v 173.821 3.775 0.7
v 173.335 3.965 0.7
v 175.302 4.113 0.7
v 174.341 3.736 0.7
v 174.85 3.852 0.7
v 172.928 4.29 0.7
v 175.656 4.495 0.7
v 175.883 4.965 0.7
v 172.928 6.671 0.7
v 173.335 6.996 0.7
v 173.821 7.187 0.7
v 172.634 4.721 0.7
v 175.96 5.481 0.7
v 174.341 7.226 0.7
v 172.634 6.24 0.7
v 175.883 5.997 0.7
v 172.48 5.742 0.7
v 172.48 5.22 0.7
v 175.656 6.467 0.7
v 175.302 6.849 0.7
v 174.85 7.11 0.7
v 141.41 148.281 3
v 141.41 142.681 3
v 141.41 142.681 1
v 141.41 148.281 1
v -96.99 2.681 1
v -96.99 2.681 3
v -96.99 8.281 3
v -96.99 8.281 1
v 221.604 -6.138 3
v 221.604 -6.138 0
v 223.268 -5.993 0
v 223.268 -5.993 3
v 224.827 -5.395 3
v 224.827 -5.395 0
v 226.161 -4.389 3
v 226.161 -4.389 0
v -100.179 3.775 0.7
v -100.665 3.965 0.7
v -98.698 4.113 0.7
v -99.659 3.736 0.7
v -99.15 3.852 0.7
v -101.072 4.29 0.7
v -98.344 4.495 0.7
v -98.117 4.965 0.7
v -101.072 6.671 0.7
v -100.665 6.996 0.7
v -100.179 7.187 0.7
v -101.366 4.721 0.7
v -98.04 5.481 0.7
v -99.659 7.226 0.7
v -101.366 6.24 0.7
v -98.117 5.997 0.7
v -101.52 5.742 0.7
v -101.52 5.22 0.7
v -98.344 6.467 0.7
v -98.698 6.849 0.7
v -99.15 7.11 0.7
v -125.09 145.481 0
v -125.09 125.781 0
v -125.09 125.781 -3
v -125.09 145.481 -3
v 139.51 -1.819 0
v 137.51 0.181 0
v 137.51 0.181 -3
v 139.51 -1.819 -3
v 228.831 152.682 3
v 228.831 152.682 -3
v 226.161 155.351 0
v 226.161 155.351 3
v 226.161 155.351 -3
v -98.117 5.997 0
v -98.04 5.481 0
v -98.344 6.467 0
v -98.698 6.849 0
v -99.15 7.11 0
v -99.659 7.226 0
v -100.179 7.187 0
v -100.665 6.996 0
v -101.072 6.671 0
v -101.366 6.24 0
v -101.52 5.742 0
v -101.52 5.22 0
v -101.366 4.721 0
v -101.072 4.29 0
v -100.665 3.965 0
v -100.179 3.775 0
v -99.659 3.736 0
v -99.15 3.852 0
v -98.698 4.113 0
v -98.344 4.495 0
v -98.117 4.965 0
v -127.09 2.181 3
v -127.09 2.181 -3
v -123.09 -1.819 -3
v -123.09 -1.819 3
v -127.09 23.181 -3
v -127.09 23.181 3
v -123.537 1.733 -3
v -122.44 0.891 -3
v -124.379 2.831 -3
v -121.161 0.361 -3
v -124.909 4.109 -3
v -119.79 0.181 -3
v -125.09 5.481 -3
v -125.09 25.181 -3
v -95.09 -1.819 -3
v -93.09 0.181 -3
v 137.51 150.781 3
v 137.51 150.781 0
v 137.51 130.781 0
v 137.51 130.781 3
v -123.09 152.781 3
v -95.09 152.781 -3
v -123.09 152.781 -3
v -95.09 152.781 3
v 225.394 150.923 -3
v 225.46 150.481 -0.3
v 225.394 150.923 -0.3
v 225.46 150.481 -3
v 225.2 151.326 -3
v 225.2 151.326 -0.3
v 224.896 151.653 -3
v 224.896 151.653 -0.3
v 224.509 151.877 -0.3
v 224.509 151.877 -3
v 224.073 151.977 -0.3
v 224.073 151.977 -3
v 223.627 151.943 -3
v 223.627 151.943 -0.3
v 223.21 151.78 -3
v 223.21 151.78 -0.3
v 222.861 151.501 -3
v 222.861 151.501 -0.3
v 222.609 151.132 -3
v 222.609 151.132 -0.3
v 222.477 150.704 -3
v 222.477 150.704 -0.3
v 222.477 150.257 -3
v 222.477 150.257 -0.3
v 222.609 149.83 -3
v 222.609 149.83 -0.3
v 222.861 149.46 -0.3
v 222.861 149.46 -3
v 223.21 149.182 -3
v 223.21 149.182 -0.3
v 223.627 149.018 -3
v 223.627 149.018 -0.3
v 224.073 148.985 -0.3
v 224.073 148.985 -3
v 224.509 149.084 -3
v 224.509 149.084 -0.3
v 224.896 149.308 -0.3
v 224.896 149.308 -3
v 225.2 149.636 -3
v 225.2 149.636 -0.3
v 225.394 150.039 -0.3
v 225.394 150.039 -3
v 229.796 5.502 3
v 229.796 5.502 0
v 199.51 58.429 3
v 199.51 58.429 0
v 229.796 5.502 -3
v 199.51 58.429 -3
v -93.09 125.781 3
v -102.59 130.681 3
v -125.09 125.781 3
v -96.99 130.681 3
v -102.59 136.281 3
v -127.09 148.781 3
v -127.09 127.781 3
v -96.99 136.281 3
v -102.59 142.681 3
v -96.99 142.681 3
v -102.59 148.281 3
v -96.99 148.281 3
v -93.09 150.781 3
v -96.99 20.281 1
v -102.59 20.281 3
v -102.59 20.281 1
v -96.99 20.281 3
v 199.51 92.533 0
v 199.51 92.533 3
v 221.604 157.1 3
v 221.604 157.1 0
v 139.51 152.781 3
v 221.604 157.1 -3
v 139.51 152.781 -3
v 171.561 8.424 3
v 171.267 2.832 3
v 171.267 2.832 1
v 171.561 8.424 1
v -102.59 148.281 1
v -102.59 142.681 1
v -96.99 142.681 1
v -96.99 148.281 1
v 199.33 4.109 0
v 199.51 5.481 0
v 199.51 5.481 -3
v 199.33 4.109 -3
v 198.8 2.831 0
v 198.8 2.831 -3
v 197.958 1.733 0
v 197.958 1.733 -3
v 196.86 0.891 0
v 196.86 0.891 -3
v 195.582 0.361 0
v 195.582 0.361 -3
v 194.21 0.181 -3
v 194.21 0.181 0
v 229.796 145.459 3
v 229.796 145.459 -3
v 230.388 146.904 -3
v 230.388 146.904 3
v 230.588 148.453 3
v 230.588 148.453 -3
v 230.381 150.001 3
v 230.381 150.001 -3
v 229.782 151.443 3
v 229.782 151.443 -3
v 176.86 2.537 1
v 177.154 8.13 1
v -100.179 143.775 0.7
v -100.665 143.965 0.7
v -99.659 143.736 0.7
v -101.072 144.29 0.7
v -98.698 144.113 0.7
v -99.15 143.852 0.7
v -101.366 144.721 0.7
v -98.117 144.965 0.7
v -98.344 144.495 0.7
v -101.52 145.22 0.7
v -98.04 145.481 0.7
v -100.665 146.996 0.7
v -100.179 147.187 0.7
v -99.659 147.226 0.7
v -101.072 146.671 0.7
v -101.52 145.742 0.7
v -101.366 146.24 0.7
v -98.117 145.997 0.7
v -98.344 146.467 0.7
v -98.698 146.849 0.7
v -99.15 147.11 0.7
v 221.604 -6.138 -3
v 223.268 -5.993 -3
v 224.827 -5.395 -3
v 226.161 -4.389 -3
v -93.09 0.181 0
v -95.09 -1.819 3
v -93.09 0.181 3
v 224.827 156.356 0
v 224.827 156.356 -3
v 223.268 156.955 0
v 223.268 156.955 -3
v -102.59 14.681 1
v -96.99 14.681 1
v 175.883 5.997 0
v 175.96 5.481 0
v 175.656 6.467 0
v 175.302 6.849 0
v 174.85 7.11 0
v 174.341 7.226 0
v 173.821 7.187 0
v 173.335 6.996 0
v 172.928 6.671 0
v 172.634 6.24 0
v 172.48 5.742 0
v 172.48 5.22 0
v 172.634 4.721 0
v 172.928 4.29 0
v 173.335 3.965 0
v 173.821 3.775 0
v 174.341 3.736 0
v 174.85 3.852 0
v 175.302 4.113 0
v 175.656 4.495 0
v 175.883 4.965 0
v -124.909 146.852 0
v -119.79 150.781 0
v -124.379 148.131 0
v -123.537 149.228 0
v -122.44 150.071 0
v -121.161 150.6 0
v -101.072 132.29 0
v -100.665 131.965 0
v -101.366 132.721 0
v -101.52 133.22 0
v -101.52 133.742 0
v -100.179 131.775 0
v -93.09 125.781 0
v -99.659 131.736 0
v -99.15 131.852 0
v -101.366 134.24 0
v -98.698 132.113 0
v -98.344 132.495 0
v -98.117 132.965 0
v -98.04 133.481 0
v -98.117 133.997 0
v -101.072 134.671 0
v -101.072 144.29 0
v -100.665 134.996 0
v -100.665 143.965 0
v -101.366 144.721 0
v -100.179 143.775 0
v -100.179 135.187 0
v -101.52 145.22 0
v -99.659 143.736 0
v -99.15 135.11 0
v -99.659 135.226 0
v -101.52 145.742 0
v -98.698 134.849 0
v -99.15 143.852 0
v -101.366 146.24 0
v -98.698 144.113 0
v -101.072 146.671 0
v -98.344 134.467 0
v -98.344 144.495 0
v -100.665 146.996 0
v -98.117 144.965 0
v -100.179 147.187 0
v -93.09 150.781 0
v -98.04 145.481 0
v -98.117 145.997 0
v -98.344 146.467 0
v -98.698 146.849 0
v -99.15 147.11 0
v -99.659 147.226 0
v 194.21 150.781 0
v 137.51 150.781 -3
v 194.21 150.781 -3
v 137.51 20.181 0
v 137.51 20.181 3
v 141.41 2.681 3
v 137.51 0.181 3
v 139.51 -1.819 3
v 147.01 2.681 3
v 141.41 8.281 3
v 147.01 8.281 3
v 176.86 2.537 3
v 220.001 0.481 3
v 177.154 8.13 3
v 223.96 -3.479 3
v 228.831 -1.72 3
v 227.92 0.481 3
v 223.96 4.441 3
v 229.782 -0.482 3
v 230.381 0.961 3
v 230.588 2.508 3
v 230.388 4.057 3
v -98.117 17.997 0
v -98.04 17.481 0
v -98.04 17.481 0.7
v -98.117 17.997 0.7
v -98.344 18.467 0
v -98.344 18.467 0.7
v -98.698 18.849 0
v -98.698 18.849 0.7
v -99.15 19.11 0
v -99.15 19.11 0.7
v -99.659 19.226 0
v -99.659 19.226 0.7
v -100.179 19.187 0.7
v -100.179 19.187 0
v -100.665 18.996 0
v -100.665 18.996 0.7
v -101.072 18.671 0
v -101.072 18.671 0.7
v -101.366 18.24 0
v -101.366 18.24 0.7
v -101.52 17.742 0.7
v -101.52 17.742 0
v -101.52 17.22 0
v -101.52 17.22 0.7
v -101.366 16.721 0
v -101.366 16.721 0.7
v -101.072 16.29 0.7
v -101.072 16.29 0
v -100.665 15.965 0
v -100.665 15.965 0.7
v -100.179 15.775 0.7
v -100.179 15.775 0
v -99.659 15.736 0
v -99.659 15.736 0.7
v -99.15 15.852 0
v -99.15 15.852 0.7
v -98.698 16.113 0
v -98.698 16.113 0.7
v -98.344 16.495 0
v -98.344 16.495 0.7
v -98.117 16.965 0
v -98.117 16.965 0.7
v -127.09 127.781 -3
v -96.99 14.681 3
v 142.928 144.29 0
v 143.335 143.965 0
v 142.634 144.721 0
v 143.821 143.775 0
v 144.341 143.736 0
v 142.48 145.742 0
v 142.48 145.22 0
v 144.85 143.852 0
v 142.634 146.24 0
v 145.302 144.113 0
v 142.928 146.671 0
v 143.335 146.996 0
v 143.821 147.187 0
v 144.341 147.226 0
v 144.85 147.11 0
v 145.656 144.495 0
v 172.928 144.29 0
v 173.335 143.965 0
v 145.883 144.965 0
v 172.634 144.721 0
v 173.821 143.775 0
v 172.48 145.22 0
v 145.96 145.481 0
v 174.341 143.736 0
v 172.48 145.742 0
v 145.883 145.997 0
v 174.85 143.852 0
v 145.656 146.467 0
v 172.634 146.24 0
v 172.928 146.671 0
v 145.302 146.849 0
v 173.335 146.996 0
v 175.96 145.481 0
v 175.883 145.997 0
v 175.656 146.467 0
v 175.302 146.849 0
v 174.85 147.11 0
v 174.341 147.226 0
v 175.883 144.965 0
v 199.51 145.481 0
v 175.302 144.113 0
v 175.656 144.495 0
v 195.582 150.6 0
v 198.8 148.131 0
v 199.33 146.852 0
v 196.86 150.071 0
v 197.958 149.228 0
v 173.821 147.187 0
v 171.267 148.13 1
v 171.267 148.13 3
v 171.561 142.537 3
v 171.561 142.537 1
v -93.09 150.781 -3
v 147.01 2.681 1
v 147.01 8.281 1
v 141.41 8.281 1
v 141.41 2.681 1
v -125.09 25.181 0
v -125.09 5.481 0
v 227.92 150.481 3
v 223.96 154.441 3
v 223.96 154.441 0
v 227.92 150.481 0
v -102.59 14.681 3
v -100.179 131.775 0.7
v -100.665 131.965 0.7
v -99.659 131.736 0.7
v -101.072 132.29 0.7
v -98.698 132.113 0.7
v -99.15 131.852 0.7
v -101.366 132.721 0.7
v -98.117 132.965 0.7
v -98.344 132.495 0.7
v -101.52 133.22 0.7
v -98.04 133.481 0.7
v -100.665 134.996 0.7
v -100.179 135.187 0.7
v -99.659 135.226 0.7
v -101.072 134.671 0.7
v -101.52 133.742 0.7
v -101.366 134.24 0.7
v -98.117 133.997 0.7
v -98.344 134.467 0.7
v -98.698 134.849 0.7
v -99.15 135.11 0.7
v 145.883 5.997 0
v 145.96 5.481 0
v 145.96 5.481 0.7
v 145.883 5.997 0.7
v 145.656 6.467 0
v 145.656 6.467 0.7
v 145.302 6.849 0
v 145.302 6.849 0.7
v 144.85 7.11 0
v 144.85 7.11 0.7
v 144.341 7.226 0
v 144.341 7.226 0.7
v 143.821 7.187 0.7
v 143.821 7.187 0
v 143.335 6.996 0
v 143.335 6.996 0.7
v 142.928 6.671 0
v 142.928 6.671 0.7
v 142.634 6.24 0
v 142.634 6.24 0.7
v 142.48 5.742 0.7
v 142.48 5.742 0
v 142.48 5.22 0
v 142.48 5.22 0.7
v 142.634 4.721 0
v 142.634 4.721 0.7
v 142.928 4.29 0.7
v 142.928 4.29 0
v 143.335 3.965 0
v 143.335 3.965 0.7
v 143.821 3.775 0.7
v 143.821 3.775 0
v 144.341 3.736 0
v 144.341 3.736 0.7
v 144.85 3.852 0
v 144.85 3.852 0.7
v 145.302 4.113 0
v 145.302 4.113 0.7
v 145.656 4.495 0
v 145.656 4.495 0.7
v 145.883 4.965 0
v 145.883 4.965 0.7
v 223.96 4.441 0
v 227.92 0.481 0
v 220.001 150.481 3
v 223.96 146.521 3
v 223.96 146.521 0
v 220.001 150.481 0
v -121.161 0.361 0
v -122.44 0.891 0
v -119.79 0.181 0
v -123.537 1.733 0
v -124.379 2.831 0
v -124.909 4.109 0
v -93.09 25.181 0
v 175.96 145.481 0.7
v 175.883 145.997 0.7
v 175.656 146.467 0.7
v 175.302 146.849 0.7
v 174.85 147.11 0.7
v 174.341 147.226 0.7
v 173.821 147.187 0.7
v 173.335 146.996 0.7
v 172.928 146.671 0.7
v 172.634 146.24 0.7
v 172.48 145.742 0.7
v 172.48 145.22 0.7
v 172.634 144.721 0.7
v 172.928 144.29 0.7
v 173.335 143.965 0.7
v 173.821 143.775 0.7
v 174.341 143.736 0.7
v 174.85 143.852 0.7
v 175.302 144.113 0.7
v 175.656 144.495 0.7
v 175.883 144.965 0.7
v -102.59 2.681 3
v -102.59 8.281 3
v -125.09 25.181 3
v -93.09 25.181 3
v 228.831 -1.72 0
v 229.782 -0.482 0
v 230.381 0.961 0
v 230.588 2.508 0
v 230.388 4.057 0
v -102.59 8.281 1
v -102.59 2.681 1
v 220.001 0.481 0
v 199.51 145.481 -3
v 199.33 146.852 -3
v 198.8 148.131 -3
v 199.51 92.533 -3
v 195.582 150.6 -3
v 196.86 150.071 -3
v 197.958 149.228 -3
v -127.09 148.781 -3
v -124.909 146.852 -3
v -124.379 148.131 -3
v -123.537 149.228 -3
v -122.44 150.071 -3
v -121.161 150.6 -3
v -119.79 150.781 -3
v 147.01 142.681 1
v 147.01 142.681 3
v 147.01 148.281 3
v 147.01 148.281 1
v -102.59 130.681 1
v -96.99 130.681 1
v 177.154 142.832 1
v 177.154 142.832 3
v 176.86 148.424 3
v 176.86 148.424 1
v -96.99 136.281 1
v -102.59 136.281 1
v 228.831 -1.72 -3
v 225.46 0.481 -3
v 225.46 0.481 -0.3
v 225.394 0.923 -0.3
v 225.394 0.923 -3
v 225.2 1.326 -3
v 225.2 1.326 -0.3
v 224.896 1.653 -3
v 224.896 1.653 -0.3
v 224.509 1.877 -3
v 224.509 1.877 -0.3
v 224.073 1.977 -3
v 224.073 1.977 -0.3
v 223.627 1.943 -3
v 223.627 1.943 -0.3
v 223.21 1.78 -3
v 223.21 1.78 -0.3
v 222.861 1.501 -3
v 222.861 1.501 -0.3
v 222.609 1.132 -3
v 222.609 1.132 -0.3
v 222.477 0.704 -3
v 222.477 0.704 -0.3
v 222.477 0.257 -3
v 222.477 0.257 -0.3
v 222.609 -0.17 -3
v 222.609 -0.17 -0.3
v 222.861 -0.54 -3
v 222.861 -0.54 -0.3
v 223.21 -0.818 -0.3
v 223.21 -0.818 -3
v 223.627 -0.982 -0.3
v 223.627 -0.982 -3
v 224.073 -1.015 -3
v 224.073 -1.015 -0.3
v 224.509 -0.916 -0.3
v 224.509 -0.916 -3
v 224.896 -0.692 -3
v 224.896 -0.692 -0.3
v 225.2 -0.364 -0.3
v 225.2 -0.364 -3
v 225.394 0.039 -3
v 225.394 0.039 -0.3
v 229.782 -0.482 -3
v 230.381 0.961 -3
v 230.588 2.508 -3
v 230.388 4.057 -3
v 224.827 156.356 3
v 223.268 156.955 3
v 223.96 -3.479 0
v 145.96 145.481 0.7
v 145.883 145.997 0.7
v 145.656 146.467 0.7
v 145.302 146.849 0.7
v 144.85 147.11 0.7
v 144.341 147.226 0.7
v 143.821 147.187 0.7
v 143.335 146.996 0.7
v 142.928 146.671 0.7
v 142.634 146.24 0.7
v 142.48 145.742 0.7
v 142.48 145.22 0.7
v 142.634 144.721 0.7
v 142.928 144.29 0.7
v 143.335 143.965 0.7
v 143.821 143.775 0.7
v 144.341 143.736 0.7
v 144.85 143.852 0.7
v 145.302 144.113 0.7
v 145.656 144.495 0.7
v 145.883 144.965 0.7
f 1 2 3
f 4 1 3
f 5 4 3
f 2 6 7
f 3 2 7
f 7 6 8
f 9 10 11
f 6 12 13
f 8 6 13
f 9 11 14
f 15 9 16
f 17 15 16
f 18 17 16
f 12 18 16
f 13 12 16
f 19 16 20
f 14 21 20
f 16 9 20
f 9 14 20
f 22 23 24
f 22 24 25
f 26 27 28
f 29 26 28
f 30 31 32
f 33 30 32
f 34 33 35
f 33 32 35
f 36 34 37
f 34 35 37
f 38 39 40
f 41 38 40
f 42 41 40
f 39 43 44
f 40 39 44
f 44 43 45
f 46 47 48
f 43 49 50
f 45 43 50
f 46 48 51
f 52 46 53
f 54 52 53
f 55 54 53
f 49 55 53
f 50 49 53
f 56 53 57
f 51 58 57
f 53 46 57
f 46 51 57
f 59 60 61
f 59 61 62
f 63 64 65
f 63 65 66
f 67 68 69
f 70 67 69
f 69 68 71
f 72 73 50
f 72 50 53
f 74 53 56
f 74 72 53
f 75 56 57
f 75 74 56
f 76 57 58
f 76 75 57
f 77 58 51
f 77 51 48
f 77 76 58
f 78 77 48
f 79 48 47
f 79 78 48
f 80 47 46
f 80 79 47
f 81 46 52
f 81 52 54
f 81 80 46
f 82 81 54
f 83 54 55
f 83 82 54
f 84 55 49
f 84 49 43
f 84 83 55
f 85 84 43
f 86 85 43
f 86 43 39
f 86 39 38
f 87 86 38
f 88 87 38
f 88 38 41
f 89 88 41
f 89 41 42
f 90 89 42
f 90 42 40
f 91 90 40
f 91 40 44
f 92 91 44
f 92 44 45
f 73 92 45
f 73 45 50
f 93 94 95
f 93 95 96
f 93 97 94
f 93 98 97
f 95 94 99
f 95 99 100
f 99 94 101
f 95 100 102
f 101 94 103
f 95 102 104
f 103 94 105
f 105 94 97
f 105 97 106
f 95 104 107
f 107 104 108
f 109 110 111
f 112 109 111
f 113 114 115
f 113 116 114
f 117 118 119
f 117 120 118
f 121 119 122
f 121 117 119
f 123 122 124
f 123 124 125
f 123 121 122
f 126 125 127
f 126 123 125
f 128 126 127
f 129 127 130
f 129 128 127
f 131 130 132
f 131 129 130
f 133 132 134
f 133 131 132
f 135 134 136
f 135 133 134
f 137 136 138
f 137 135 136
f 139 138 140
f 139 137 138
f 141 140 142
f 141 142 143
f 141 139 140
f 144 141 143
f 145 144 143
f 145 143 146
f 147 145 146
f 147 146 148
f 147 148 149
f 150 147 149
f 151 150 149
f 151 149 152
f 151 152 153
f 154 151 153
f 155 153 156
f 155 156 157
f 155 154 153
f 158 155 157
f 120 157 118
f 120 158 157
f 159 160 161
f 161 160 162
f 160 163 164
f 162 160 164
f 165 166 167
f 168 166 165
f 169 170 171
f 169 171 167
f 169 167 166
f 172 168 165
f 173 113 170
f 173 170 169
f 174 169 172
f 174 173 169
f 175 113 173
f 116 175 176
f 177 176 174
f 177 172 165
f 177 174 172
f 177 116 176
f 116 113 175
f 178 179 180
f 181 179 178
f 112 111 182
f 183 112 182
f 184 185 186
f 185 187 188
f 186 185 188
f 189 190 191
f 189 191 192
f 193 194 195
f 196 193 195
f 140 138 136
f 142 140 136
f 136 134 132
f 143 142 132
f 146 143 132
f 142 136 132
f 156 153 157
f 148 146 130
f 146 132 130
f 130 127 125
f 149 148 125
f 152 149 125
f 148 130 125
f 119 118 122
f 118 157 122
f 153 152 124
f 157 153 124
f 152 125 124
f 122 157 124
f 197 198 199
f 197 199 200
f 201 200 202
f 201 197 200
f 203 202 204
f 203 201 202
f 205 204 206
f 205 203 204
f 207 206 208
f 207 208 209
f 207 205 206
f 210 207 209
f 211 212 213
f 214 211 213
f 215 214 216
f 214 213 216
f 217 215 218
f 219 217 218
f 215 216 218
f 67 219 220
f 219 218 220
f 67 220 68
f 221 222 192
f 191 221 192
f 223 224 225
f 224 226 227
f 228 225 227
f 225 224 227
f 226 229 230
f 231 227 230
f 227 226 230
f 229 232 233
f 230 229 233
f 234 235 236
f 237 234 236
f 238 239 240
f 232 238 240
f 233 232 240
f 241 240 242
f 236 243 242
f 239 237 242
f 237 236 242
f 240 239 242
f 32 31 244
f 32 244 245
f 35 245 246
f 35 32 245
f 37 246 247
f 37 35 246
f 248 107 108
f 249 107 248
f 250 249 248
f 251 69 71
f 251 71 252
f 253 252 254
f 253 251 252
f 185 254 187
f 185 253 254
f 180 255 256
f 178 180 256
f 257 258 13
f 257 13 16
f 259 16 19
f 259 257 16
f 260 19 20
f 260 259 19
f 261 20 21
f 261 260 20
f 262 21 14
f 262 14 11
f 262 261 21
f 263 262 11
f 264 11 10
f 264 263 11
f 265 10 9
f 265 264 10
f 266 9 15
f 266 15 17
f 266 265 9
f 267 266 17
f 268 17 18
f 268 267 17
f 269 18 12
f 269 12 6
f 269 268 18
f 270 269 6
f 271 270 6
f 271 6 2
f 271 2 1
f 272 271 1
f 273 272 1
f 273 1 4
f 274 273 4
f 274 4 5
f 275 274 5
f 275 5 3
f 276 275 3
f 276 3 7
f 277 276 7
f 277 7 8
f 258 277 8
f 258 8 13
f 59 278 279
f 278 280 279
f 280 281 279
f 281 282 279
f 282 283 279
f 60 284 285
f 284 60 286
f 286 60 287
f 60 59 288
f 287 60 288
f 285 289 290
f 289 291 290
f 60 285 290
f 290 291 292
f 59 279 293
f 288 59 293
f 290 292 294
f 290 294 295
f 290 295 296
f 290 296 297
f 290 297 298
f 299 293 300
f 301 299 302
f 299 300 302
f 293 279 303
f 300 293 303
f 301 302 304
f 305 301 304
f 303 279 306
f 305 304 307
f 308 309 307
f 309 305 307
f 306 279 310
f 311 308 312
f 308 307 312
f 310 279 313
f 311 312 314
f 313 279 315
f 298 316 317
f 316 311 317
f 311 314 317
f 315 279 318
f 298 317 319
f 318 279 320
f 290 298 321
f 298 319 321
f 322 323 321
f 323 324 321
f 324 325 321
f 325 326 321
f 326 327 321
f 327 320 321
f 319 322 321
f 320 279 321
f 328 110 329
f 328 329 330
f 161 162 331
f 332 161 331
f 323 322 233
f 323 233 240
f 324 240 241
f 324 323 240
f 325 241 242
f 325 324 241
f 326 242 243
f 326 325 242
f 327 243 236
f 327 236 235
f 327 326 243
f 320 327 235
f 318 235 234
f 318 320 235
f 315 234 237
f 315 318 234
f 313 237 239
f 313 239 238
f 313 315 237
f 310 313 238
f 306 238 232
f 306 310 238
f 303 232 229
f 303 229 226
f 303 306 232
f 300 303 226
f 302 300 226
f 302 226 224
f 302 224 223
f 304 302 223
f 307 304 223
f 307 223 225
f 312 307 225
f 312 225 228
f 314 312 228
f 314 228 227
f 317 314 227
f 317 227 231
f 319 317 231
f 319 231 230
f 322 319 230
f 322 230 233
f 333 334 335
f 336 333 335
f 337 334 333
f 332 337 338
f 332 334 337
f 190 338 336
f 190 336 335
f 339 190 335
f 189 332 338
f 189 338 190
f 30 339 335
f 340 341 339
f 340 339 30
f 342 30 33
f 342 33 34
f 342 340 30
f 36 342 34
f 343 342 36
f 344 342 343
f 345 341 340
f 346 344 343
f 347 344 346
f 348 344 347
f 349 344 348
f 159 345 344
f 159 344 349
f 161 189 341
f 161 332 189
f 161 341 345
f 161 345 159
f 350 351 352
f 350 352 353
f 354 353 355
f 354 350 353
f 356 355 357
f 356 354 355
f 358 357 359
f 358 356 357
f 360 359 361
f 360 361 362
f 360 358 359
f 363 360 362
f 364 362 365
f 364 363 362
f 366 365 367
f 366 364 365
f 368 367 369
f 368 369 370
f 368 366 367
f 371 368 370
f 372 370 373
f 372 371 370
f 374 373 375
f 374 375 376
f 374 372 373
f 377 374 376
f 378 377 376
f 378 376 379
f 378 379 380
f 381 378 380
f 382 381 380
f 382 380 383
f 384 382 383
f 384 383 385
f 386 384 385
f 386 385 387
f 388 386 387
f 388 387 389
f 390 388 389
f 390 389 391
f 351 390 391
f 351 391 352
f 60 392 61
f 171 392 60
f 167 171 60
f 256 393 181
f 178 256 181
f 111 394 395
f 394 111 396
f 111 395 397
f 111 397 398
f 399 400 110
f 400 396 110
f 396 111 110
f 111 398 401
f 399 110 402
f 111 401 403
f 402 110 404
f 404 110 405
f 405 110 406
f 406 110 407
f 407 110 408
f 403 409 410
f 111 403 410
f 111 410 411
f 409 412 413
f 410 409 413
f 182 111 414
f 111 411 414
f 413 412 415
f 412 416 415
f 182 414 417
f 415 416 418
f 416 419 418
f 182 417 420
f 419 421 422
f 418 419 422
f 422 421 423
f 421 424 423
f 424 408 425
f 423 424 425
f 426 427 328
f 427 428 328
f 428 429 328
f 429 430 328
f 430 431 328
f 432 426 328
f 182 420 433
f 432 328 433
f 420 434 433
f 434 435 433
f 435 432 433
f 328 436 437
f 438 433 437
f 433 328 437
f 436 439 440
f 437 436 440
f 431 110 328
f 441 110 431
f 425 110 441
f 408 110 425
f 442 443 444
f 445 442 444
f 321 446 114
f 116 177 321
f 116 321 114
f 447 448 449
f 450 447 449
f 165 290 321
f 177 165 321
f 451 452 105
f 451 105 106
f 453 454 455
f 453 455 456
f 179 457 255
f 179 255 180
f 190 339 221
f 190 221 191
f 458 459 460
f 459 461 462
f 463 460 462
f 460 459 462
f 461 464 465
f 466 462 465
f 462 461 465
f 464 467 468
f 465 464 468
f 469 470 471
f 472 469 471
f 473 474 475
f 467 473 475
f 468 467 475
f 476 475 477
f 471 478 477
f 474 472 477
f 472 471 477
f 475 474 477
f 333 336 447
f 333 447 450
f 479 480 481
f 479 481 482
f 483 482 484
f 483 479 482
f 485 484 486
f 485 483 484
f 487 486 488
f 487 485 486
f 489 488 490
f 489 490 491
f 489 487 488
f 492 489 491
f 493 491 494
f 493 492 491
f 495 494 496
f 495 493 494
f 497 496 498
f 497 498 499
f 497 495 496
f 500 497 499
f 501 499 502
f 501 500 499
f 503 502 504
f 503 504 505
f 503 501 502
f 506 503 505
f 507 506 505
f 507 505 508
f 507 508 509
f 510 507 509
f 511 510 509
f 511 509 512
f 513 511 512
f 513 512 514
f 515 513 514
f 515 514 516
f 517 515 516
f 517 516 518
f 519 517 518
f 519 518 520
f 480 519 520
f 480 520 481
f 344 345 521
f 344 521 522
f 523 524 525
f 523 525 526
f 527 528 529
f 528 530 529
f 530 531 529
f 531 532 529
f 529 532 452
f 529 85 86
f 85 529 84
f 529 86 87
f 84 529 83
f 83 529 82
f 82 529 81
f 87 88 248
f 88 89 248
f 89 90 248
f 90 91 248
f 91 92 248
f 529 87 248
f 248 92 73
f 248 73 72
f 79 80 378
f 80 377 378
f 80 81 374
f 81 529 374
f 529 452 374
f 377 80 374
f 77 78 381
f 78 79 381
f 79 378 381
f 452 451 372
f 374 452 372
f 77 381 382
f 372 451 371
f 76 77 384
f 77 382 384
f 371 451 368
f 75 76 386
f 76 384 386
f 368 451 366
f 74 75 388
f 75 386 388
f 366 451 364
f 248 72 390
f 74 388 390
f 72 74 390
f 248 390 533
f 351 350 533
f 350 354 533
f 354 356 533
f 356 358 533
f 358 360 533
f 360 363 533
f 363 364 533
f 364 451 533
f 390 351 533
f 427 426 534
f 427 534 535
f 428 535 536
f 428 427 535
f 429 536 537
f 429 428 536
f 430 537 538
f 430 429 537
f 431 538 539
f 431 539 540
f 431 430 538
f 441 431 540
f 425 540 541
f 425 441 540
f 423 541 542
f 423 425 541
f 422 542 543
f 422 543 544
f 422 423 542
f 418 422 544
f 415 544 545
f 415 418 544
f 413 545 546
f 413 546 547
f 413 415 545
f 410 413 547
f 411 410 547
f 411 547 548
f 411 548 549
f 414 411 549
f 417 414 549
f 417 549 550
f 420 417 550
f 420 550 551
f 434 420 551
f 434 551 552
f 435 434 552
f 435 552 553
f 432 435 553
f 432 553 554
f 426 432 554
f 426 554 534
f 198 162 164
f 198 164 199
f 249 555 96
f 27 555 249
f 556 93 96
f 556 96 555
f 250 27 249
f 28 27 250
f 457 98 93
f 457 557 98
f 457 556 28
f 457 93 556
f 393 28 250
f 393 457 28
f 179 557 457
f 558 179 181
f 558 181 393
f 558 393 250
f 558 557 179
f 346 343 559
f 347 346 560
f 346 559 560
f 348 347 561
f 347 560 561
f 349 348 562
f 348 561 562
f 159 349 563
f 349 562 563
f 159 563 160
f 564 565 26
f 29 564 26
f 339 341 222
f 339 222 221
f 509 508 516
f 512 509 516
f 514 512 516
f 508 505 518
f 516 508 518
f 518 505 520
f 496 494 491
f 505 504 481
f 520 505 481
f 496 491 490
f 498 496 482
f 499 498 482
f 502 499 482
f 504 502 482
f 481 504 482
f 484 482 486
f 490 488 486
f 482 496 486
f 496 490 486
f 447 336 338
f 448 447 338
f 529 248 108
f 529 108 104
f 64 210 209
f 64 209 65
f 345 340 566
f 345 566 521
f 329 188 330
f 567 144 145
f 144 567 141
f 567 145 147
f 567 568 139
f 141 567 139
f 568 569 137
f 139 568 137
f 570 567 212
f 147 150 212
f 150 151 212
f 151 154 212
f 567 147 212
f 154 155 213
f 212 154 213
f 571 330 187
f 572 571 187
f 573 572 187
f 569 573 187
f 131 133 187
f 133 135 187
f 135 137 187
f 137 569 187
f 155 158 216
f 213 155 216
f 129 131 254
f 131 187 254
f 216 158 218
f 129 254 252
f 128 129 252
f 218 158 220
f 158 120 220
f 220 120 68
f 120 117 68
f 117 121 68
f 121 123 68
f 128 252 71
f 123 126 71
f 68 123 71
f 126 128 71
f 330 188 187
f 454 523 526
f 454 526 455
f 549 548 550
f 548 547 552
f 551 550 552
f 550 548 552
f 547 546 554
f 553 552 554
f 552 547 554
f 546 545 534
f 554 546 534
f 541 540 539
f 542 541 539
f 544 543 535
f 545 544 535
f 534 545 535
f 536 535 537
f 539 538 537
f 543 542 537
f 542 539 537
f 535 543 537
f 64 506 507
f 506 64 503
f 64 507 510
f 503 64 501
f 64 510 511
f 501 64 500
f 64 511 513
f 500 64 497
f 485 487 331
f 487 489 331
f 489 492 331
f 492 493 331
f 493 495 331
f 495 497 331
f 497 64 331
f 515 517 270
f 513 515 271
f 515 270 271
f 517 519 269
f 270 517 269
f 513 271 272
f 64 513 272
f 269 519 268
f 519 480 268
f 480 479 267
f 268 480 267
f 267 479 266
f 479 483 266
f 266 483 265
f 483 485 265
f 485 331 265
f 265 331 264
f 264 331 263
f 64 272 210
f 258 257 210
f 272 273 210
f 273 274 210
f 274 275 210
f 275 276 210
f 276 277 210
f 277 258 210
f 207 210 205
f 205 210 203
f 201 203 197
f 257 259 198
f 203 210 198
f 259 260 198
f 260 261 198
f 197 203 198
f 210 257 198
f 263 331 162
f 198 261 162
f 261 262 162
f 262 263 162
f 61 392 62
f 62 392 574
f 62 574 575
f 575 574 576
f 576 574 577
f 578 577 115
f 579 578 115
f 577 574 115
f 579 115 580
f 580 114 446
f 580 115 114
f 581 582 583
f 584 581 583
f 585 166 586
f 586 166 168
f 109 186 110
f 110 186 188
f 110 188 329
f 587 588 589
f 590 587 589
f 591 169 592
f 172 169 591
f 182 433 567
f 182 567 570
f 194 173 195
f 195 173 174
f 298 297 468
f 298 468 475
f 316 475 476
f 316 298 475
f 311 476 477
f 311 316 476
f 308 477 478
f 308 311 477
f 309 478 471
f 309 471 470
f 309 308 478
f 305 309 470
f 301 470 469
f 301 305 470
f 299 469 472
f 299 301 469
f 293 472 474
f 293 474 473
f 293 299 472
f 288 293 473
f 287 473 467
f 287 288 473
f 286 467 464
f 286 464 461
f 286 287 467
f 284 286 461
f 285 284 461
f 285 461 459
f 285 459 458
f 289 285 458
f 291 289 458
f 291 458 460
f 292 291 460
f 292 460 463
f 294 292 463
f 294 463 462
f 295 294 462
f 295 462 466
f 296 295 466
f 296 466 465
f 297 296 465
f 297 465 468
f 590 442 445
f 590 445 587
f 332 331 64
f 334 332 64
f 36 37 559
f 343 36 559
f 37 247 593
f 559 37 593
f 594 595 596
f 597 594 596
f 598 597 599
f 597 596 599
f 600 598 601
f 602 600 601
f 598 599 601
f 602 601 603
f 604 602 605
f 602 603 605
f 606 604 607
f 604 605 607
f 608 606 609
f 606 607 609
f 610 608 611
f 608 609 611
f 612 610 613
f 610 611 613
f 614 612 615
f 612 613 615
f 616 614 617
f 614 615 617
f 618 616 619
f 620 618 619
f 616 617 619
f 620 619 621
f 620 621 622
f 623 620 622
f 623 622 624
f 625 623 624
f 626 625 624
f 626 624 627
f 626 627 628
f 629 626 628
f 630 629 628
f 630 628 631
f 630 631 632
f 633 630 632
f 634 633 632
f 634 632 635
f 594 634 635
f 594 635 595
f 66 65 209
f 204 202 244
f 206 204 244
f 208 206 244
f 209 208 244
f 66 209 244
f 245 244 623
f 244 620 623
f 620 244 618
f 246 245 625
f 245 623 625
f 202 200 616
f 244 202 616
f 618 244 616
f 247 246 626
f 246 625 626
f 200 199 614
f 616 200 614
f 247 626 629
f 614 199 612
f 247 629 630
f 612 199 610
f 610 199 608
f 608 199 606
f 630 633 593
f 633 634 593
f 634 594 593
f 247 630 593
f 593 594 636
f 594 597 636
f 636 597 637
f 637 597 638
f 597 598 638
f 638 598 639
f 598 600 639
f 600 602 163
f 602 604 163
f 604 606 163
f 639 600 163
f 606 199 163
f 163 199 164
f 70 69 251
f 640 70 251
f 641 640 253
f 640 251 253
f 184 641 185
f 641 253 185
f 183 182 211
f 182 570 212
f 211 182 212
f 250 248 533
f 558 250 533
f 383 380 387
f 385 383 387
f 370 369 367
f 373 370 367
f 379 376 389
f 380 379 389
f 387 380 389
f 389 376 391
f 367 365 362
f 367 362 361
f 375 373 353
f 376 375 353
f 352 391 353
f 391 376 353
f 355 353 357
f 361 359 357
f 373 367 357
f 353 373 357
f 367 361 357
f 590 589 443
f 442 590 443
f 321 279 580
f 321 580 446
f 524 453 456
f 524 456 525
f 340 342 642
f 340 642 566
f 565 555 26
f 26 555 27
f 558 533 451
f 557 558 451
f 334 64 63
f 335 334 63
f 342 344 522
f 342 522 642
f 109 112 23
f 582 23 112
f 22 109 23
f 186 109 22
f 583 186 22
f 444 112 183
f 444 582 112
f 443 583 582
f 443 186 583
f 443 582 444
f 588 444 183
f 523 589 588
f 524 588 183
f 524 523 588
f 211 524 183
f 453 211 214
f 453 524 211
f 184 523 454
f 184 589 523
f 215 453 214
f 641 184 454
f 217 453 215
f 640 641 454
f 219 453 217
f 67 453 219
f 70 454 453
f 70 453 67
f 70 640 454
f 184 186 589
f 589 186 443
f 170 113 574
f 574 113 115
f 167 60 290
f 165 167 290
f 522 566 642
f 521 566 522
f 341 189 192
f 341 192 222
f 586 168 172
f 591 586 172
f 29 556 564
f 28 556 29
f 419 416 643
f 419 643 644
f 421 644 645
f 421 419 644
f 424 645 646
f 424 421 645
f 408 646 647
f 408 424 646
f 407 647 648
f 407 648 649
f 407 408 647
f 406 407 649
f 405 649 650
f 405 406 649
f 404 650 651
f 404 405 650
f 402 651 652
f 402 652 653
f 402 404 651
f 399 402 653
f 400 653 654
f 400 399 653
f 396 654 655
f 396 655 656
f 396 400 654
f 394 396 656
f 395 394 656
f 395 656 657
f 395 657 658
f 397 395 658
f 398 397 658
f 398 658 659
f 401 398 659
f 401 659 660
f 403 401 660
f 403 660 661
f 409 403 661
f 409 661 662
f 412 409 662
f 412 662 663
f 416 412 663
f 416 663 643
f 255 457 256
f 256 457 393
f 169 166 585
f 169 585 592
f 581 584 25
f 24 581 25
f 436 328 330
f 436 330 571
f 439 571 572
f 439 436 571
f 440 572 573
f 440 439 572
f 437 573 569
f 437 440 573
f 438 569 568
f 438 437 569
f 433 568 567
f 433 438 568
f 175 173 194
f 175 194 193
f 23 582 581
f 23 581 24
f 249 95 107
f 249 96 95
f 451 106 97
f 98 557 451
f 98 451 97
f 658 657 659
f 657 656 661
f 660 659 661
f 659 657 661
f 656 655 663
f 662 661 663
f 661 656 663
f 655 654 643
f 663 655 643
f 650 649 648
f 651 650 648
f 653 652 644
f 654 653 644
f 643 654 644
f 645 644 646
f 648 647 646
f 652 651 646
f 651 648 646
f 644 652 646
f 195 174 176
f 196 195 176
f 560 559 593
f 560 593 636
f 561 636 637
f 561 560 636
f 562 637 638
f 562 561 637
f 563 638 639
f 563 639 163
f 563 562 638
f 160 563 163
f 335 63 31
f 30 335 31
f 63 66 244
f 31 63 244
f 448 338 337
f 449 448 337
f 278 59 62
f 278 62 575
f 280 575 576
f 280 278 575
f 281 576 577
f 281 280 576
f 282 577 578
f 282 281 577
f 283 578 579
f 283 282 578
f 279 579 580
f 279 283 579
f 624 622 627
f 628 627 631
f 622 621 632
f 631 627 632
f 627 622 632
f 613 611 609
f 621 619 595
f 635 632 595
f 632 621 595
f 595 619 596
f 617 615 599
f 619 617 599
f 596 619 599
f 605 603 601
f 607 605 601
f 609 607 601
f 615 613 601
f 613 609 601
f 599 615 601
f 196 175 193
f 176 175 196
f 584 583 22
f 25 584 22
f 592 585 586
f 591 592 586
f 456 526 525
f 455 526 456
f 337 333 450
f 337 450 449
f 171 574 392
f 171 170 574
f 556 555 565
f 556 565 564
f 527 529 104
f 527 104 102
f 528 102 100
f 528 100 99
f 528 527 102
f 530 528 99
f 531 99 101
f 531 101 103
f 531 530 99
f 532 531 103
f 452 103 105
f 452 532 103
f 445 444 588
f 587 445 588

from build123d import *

# Parameters (mm, degrees)
SKETCH1_R                   = 1.5
BOSS_EXTRUDE1_DEPTH         = 3
BOSS_EXTRUDE2_OUTLINE_R     = 1.75
BOSS_EXTRUDE2_OUTLINE_R_2   = 1.5
BOSS_EXTRUDE2_DEPTH         = 3
BOSS_EXTRUDE2_2_OUTLINE_R   = 1.75
BOSS_EXTRUDE2_2_OUTLINE_R_2 = 1.5
BOSS_EXTRUDE2_2_DEPTH       = 3
SKETCH2_W                   = 5.6
SKETCH2_H                   = 5.6
CUT_EXTRUDE3_DEPTH          = 2
SKETCH3_R                   = 1.75
BOSS_EXTRUDE3_DEPTH         = 3
BOSS_EXTRUDE4_DEPTH         = 3
CHAMFER1_SIZE               = 4
CHAMFER2_SIZE               = 4
CUT_EXTRUDE4_DEPTH          = 1
SKETCH5_W                   = 5.6
SKETCH5_H                   = 5.6
CUT_EXTRUDE5_DEPTH          = 2
BOSS_EXTRUDE5_START         = -0.3
SKETCH6_R                   = 1.75
BOSS_EXTRUDE5_DEPTH         = 0.3
SKETCH7_R                   = 1.5
BOSS_EXTRUDE6_DEPTH         = 0.3


# Read off the part's stored shape, not the designer's step: Boss-Extrude2
with BuildPart() as part:
    # Sketch1 → Boss-Extrude1 (new body)
    # profile 1 of 4: a face of its own
    with BuildSketch(Plane.XY):
        with BuildLine():
            Line((229.79564609, 5.502306365), (199.510489142, 58.42891882))
            Line((199.510489142, 58.42891882), (199.510489142, 5.762730679))
            Line((199.510489142, 5.762730679), (218.9389204, -5.354419326))
            ThreePointArc((218.9389204, -5.354419326), (220.225257958, -5.902741482), (221.603580618, -6.13842803))
            ThreePointArc((221.603580618, -6.13842803), (224.068457171, -5.7484178), (226.161463425, -4.389355907))
            Line((226.161463425, -4.389355907), (228.830582671, -1.72023666))
            ThreePointArc((228.830582671, -1.72023666), (230.535087191, 1.727757007), (229.79564609, 5.502306365))
        make_face()
        with Locations((223.960489142, 0.480737622)):
            Circle(SKETCH1_R, mode=Mode.SUBTRACT)
    # profile 2 of 4: a face of its own
    with BuildSketch(Plane.XY):
        with BuildLine():
            Line((199.510489142, 145.198744566), (199.510489142, 92.532556425))
            Line((199.510489142, 92.532556425), (229.79564609, 145.45916888))
            ThreePointArc((229.79564609, 145.45916888), (230.535087191, 149.233718237), (228.830582671, 152.681711905))
            Line((228.830582671, 152.681711905), (226.161463425, 155.350831151))
            ThreePointArc((226.161463425, 155.350831151), (224.068457171, 156.709893045), (221.603580618, 157.099903275))
            ThreePointArc((221.603580618, 157.099903275), (220.225257958, 156.864216727), (218.9389204, 156.31589457))
            Line((218.9389204, 156.31589457), (199.510489142, 145.198744566))
        make_face()
        with Locations((223.960489142, 150.480737622)):
            Circle(SKETCH1_R, mode=Mode.SUBTRACT)
    # profile 3 of 4: a face of its own
    with BuildSketch(Plane.XY):
        with BuildLine():
            Line((218.9389204, -5.354419326), (199.510489142, 5.762730679))
            Line((199.510489142, 5.762730679), (199.510489142, 5.480737623))
            ThreePointArc((199.510489142, 5.480737623), (197.958155082, 1.733071682), (194.210489142, 0.180737622))
            Line((194.210489142, 0.180737622), (137.510489142, 0.180737622))
            Line((137.510489142, 0.180737623), (139.510489142, -1.819262377))
            Line((139.510489142, -1.819262377), (221.603580618, -6.13842803))
            ThreePointArc((221.603580618, -6.13842803), (220.225257958, -5.902741482), (218.9389204, -5.354419326))
        make_face()
    # profile 4 of 4: a face of its own
    with BuildSketch(Plane.XY):
        with BuildLine():
            Line((199.510489142, 145.480737623), (199.510489142, 145.198744566))
            Line((199.510489142, 145.198744566), (218.9389204, 156.31589457))
            ThreePointArc((218.9389204, 156.31589457), (220.225257958, 156.864216727), (221.603580618, 157.099903275))
            Line((221.603580618, 157.099903275), (139.510489142, 152.780737622))
            Line((139.510489142, 152.780737622), (137.510489142, 150.780737622))
            Line((137.510489142, 150.780737622), (194.210489141, 150.780737622))
            ThreePointArc((194.210489141, 150.780737622), (197.958155082, 149.228403563), (199.510489142, 145.480737623))
        make_face()
    extrude(amount=-BOSS_EXTRUDE1_DEPTH)

    # Boss-Extrude2 outline → Boss-Extrude2 (add)
    with BuildSketch(Plane.XY):
        with BuildLine():
            Line((228.830582671, 152.681711905), (226.161463425, 155.350831151))
            ThreePointArc((226.161463425, 155.350831151), (224.068457172, 156.709893045), (221.603580618, 157.099903275))
            Line((221.603580618, 157.099903275), (139.510489142, 152.780737622))
            Line((139.510489142, 152.780737622), (137.510489142, 150.780737622))
            Line((137.510489142, 150.780737622), (137.510489142, 130.780737622))
            Line((137.510489142, 130.780737622), (199.510489142, 92.532556425))
            Line((199.510489142, 92.532556425), (229.79564609, 145.45916888))
            ThreePointArc((229.79564609, 145.45916888), (230.535087191, 149.233718237), (228.830582671, 152.681711905))
        make_face()
        with Locations((144.210489142, 145.480737622)):
            Circle(BOSS_EXTRUDE2_OUTLINE_R, mode=Mode.SUBTRACT)
        with Locations((174.210489142, 145.480737622)):
            Circle(BOSS_EXTRUDE2_OUTLINE_R, mode=Mode.SUBTRACT)
        with Locations((223.960489142, 150.480737622)):
            Circle(BOSS_EXTRUDE2_OUTLINE_R_2, mode=Mode.SUBTRACT)
    extrude(amount=BOSS_EXTRUDE2_DEPTH)


with BuildPart() as body_2:
    # Boss-Extrude2 2 outline → Boss-Extrude2 2 (new body)
    with BuildSketch(Plane.XY):
        with BuildLine():
            Line((199.510489142, 58.42891882), (137.510489142, 20.180737623))
            Line((137.510489142, 20.180737623), (137.510489142, 0.180737622))
            Line((137.510489142, 0.180737622), (139.510489142, -1.819262377))
            Line((139.510489142, -1.819262377), (221.603580618, -6.13842803))
            ThreePointArc((221.603580618, -6.13842803), (224.068457172, -5.7484178), (226.161463425, -4.389355907))
            Line((226.161463425, -4.389355907), (228.830582671, -1.72023666))
            ThreePointArc((228.830582671, -1.72023666), (230.535087191, 1.727757008), (229.79564609, 5.502306365))
            Line((229.79564609, 5.502306365), (199.510489142, 58.42891882))
        make_face()
        with Locations((144.210489142, 5.480737622)):
            Circle(BOSS_EXTRUDE2_2_OUTLINE_R, mode=Mode.SUBTRACT)
        with Locations((174.210489142, 5.480737622)):
            Circle(BOSS_EXTRUDE2_2_OUTLINE_R, mode=Mode.SUBTRACT)
        with Locations((223.960489142, 0.480737622)):
            Circle(BOSS_EXTRUDE2_2_OUTLINE_R_2, mode=Mode.SUBTRACT)
    extrude(amount=BOSS_EXTRUDE2_2_DEPTH)


with BuildPart() as cut_extrude3_tool:
    # Sketch2 → Cut-Extrude3 (new body)
    with BuildSketch(Plane(origin=(0, 0, 3), x_dir=(-1, 0, 0), z_dir=(0, 0, -1))):
        Polygon((-177.153734776, 142.831717967), (-176.859508797, 148.423983257), (-171.267243507, 148.129757278), (-171.561469486, 142.537491988), align=None)
        with Locations((-144.210489142, 145.480737622)):
            Rectangle(SKETCH2_W, SKETCH2_H)
        Polygon((-227.920287116, 150.480737622), (-223.960489142, 146.520939648), (-220.000691167, 150.480737622), (-223.960489142, 154.440535597), align=None)
        Polygon((-227.920287116, 0.480737622), (-223.960489142, -3.479060352), (-220.000691167, 0.480737622), (-223.960489142, 4.440535597), align=None)
        Polygon((-177.153734776, 8.129757278), (-176.859508797, 2.537491988), (-171.267243507, 2.831717967), (-171.561469486, 8.423983257), align=None)
        with Locations((-144.210489142, 5.480737622)):
            Rectangle(SKETCH2_W, SKETCH2_H)
    extrude(amount=CUT_EXTRUDE3_DEPTH)


with BuildPart() as part_1:
    add(part.part)

    # Cut-Extrude3: cut by cut_extrude3_tool
    add(cut_extrude3_tool.part, mode=Mode.SUBTRACT)


with BuildPart() as body_2_1:
    add(body_2.part)

    # Cut-Extrude3: cut by cut_extrude3_tool
    add(cut_extrude3_tool.part, mode=Mode.SUBTRACT)


with BuildPart() as part_2:
    add(part_1.part)

    # Combine1: union body 2
    add(body_2_1.part)

    # Sketch4 → Cut-Extrude4 (cut)
    with BuildSketch(Plane.XY.offset(1)):
        Polygon((227.920287116, 0.480737622), (223.960489142, 4.440535597), (220.000691167, 0.480737622), (223.960489142, -3.479060352), align=None)
        Polygon((227.920287116, 150.480737622), (223.960489142, 154.440535597), (220.000691167, 150.480737622), (223.960489142, 146.520939648), align=None)
    extrude(amount=-CUT_EXTRUDE4_DEPTH, mode=Mode.SUBTRACT)



with BuildPart() as body_2_2:
    # Sketch3 → Boss-Extrude3 (new body)
    # profile 1 of 4: a face of its own
    with BuildSketch(Plane.XY):
        with BuildLine():
            Line((-93.089510858, 25.180737622), (-125.089510858, 25.180737622))
            Line((-125.089510858, 25.180737622), (-125.089510858, 5.480737622))
            ThreePointArc((-125.089510858, 5.480737622), (-123.537176799, 1.733071682), (-119.789510858, 0.180737622))
            Line((-119.789510858, 0.180737622), (-93.089510858, 0.180737622))
            Line((-93.089510858, 0.180737622), (-93.089510858, 25.180737622))
        make_face()
        with Locations((-99.789510858, 5.480737622)):
            Circle(SKETCH3_R, mode=Mode.SUBTRACT)
        with Locations((-99.789510858, 17.480737622)):
            Circle(SKETCH3_R, mode=Mode.SUBTRACT)
    # profile 2 of 4: a face of its own
    with BuildSketch(Plane.XY):
        with BuildLine():
            Line((-125.089510858, 5.480737622), (-125.089510858, 25.180737622))
            Line((-125.089510858, 25.180737622), (-127.089510858, 23.180737622))
            Line((-127.089510858, 23.180737622), (-127.089510858, -1.819262378))
            Line((-127.089510858, -1.819262378), (-95.089510858, -1.819262378))
            Line((-95.089510858, -1.819262378), (-93.089510858, 0.180737622))
            Line((-93.089510858, 0.180737622), (-119.789510858, 0.180737622))
            ThreePointArc((-119.789510858, 0.180737622), (-123.537176799, 1.733071682), (-125.089510858, 5.480737622))
        make_face()
    # profile 3 of 4: a face of its own
    with BuildSketch(Plane.XY):
        with BuildLine():
            Line((-125.089510858, 145.480737622), (-125.089510858, 125.780737622))
            Line((-125.089510858, 125.780737622), (-93.089510858, 125.780737622))
            Line((-93.089510858, 125.780737622), (-93.089510858, 150.780737622))
            Line((-93.089510858, 150.780737622), (-119.789510858, 150.780737622))
            ThreePointArc((-119.789510858, 150.780737622), (-123.537176799, 149.228403563), (-125.089510858, 145.480737622))
        make_face()
        with Locations((-99.789510858, 133.480737622)):
            Circle(SKETCH3_R, mode=Mode.SUBTRACT)
        with Locations((-99.789510858, 145.480737622)):
            Circle(SKETCH3_R, mode=Mode.SUBTRACT)
    # profile 4 of 4: a face of its own
    with BuildSketch(Plane.XY):
        with BuildLine():
            Line((-127.089510858, 127.780737622), (-125.089510858, 125.780737622))
            Line((-125.089510858, 125.780737622), (-125.089510858, 145.480737622))
            ThreePointArc((-125.089510858, 145.480737622), (-123.537176799, 149.228403563), (-119.789510858, 150.780737622))
            Line((-119.789510858, 150.780737622), (-93.089510858, 150.780737622))
            Line((-93.089510858, 150.780737622), (-95.089510858, 152.780737622))
            Line((-95.089510858, 152.780737622), (-127.089510858, 152.780737622))
            Line((-127.089510858, 152.780737622), (-127.089510858, 127.780737622))
        make_face()
    extrude(amount=BOSS_EXTRUDE3_DEPTH)

    # Sketch3<3> → Boss-Extrude4 (add)
    with BuildSketch(Plane.XY):
        with BuildLine():
            Line((-125.089510858, 5.480737622), (-125.089510858, 25.180737622))
            Line((-125.089510858, 25.180737622), (-127.089510858, 23.180737622))
            Line((-127.089510858, 23.180737622), (-127.089510858, -1.819262378))
            Line((-127.089510858, -1.819262378), (-95.089510858, -1.819262378))
            Line((-95.089510858, -1.819262378), (-93.089510858, 0.180737622))
            Line((-93.089510858, 0.180737622), (-119.789510858, 0.180737622))
            ThreePointArc((-119.789510858, 0.180737622), (-123.537176799, 1.733071682), (-125.089510858, 5.480737622))
        make_face()
        with BuildLine():
            Line((-127.089510858, 127.780737622), (-125.089510858, 125.780737622))
            Line((-125.089510858, 125.780737622), (-125.089510858, 145.480737622))
            ThreePointArc((-125.089510858, 145.480737622), (-123.537176799, 149.228403563), (-119.789510858, 150.780737622))
            Line((-119.789510858, 150.780737622), (-93.089510858, 150.780737622))
            Line((-93.089510858, 150.780737622), (-95.089510858, 152.780737622))
            Line((-95.089510858, 152.780737622), (-127.089510858, 152.780737622))
            Line((-127.089510858, 152.780737622), (-127.089510858, 127.780737622))
        make_face()
    extrude(amount=-BOSS_EXTRUDE4_DEPTH)

    # Chamfer1
    chamfer1_edges = [body_2_2.edges().sort_by_distance(p)[0] for p in [
        (-127.089510858, 152.780737622, 0),
    ]]
    chamfer(chamfer1_edges, length=CHAMFER1_SIZE)

    # Chamfer2
    chamfer2_edges = [body_2_2.edges().sort_by_distance(p)[0] for p in [
        (-127.089510858, -1.819262378, 0),
    ]]
    chamfer(chamfer2_edges, length=CHAMFER2_SIZE)

    # Sketch5 → Cut-Extrude5 (cut)
    with BuildSketch(Plane.XY.offset(3)):
        with Locations((-99.789510858, 145.480737622)):
            Rectangle(SKETCH5_W, SKETCH5_H)
        with Locations((-99.789510858, 133.480737622)):
            Rectangle(SKETCH5_W, SKETCH5_H)
        with Locations((-99.789510858, 17.480737622)):
            Rectangle(SKETCH5_W, SKETCH5_H)
        with Locations((-99.789510858, 5.480737622)):
            Rectangle(SKETCH5_W, SKETCH5_H)
    extrude(amount=-CUT_EXTRUDE5_DEPTH, mode=Mode.SUBTRACT)


with BuildPart() as part_3:
    add(part_2.part)

    add(body_2_2.part)  # Boss-Extrude5 merges body 2 2
    # Sketch6 → Boss-Extrude5 (add)
    with BuildSketch(Plane.XY.offset(1).offset(BOSS_EXTRUDE5_START)):
        with Locations((-99.789510858, 145.480737622)):
            Circle(SKETCH6_R)
        with Locations((-99.789510858, 133.480737622)):
            Circle(SKETCH6_R)
        with Locations((-99.789510858, 17.480737622)):
            Circle(SKETCH6_R)
        with Locations((-99.789510858, 5.480737622)):
            Circle(SKETCH6_R)
        with Locations((144.210489142, 145.480737622)):
            Circle(SKETCH6_R)
        with Locations((174.210489142, 145.480737622)):
            Circle(SKETCH6_R)
        with Locations((144.210489142, 5.480737622)):
            Circle(SKETCH6_R)
        with Locations((174.210489142, 5.480737622)):
            Circle(SKETCH6_R)
    extrude(amount=BOSS_EXTRUDE5_DEPTH)

    # Sketch7 → Boss-Extrude6 (add)
    with BuildSketch(Plane.XY):
        with Locations((223.960489142, 0.480737622)):
            Circle(SKETCH7_R)
        with Locations((223.960489142, 150.480737622)):
            Circle(SKETCH7_R)
    extrude(amount=-BOSS_EXTRUDE6_DEPTH)


solid = part_3.part
